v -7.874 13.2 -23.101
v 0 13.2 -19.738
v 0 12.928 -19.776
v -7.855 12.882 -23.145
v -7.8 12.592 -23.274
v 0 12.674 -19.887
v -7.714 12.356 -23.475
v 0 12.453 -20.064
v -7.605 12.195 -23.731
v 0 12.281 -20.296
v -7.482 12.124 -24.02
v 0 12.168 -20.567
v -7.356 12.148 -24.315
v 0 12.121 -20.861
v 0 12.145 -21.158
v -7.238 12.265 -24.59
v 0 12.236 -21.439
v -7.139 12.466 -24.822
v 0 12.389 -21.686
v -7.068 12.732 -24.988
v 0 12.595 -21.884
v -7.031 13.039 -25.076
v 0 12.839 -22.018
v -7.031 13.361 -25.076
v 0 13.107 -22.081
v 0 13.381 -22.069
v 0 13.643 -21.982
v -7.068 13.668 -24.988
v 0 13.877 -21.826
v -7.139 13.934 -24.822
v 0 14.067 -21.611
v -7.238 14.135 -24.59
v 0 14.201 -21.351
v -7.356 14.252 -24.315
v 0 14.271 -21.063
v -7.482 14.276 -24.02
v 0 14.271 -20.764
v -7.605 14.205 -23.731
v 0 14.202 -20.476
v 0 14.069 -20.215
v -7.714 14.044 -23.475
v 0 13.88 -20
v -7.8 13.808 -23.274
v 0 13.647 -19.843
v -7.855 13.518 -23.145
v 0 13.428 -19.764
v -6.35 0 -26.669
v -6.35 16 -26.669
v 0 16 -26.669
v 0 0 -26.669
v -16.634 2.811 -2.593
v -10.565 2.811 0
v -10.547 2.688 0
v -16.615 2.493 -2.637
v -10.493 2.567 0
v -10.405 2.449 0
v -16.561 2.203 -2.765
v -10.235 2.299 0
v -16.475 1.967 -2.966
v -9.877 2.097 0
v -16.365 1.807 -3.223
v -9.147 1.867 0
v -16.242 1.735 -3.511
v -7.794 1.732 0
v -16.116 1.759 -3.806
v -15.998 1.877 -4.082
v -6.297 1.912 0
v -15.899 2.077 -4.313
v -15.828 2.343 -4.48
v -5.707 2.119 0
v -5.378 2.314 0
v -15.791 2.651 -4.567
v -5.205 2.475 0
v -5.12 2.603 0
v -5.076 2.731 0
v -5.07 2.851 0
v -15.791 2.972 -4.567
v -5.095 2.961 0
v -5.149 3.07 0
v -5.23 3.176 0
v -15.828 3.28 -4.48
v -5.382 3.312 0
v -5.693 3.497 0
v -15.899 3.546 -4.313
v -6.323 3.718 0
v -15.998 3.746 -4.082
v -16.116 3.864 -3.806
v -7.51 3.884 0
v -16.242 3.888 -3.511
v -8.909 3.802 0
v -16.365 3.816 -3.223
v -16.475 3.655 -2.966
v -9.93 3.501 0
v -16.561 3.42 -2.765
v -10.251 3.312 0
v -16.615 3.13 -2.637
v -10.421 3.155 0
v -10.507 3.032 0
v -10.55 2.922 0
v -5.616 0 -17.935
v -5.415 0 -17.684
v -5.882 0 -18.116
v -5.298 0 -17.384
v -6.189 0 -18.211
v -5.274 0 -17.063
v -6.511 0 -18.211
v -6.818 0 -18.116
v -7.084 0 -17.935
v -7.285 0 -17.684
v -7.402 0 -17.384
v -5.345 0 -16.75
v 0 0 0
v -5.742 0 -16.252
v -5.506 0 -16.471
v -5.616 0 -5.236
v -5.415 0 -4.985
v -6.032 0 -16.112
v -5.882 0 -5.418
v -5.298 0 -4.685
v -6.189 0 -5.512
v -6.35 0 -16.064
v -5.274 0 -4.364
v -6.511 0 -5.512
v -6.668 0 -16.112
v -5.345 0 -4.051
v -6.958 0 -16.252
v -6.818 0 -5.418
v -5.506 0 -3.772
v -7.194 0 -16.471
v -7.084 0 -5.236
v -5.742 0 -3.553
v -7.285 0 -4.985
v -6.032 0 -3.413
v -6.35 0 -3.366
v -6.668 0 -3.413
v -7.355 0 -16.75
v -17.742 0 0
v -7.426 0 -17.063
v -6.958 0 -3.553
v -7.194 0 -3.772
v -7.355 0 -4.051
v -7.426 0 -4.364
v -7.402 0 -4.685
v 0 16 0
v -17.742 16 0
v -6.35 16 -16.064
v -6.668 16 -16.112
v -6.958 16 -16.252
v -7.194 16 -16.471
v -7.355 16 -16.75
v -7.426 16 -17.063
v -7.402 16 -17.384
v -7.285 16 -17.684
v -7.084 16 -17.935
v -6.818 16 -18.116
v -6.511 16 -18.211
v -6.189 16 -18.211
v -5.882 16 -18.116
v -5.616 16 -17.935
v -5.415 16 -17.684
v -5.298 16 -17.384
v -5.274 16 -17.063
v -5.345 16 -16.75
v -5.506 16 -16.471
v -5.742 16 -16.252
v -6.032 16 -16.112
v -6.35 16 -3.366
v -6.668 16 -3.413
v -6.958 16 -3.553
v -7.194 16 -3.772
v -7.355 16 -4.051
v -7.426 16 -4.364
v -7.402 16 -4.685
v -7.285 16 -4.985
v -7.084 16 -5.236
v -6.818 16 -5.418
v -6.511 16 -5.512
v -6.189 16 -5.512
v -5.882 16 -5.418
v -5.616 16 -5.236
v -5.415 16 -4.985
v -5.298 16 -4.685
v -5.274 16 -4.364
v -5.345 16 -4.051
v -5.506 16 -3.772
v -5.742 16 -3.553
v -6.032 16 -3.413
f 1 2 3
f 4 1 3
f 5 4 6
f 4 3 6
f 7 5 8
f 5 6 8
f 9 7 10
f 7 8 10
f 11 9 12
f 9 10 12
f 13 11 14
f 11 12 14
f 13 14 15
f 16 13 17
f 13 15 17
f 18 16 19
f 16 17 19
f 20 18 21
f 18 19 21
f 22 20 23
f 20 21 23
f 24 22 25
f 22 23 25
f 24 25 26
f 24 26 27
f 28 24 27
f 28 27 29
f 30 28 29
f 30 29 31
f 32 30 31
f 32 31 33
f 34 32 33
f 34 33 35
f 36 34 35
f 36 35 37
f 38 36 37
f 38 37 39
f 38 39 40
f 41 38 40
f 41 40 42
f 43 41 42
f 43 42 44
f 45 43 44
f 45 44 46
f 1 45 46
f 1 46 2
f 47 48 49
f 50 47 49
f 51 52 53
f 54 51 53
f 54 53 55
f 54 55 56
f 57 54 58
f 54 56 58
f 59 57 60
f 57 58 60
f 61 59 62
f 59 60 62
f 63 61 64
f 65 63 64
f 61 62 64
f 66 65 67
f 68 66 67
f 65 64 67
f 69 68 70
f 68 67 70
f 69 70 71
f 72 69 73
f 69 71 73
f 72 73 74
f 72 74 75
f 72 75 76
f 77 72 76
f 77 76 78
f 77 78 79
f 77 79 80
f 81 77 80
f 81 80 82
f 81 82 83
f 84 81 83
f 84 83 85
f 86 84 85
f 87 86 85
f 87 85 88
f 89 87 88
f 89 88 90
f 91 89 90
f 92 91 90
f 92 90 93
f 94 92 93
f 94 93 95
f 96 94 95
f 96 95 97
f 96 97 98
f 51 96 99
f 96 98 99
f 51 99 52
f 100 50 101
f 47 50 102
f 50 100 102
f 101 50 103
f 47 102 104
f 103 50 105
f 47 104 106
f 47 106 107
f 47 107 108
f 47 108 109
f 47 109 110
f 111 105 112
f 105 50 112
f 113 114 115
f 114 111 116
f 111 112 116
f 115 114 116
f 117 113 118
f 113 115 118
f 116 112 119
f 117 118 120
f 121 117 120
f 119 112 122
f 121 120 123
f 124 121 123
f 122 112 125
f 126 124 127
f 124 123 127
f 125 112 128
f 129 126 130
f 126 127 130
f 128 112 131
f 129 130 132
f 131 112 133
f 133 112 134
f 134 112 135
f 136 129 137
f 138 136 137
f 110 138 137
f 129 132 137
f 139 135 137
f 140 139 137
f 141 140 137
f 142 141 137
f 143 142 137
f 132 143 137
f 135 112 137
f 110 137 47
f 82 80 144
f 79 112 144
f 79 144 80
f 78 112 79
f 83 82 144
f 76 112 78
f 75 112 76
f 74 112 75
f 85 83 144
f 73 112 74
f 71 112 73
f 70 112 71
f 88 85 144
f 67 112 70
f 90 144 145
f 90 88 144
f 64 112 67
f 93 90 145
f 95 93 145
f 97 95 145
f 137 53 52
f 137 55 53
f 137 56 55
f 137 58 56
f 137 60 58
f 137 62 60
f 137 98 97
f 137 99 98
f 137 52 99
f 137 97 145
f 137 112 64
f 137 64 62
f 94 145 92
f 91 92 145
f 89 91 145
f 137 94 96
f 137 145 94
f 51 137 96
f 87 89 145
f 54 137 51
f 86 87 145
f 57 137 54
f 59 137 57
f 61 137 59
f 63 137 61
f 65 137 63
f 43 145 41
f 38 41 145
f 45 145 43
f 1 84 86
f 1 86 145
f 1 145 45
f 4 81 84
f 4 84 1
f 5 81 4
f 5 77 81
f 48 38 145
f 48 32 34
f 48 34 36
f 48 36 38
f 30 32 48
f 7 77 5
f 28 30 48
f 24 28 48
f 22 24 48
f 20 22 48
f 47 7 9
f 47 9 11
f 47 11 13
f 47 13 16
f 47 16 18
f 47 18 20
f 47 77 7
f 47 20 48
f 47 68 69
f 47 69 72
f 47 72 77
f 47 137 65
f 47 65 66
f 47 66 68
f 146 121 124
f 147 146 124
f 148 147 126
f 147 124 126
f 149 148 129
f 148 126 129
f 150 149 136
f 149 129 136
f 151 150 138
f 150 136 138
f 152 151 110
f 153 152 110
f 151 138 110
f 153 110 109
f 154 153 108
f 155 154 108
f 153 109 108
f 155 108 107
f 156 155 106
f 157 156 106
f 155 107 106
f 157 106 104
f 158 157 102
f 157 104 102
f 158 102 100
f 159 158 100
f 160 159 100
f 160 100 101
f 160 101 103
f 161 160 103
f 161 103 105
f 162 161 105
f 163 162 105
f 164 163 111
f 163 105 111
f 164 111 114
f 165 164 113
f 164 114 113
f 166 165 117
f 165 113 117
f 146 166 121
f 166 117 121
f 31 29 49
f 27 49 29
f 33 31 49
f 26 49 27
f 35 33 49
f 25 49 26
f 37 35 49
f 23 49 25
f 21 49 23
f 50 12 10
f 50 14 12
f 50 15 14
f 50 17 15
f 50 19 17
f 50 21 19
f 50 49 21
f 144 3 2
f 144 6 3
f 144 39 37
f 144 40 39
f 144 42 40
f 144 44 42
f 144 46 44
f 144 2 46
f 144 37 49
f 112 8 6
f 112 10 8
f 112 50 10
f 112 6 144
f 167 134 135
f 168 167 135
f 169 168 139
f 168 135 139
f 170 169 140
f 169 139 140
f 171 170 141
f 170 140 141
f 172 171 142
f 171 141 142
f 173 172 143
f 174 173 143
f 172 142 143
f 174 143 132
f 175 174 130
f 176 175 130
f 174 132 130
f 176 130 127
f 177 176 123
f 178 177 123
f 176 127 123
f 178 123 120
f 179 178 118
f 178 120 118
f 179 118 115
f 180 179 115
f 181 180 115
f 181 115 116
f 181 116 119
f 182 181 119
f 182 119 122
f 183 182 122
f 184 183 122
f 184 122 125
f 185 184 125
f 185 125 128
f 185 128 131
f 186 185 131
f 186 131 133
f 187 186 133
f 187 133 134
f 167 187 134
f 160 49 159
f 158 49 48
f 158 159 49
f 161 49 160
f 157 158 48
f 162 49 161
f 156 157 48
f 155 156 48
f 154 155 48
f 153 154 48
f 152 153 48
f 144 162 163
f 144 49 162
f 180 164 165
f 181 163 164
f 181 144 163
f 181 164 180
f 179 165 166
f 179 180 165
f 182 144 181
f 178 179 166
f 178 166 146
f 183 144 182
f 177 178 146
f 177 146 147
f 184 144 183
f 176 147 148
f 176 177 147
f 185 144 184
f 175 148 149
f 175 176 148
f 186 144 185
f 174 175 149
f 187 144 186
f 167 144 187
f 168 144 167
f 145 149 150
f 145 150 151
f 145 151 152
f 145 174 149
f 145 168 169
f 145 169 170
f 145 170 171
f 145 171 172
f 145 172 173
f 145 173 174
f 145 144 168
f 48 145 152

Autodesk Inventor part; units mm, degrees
ref_plane "YZ Plane" through (0, 0, 0) normal (1, 0, 0) x (0, 1, 0)
ref_plane "XZ Plane" through (0, 0, 0) normal (0, 1, 0) x (-1, 0, 0)
ref_plane "XY Plane" through (0, 0, 0) normal (0, 0, 1) x (1, 0, 0)
sketch "Sketch1" plane through (0, 0, 0) normal (0, 1, 0) x (-1, 0, 0)
  line L0 (0, 0) -> (17.7417, 0)
  line L1 (17.7417, 0) -> (6.35, -26.6689)
  line L2 (6.35, -26.6689) -> (0, -26.6689)
  line L3 (0, -26.6689) -> (0, 0)
  dimension "d0" = 23.13
  dimension "d1" = 29
  dimension "d2" = 6.35
extrude "Extrusion1" add sketch "Sketch1" along normal blind 16
sketch "Sketch2" plane through (-17.7417, 0, 0) normal (-0.9196159, 0, -0.3928187) x (-0.3928187, 0, 0.9196159)
  line L0 (-29, 16) -> (0, 16) construction
  line L1 (-29, 0) -> (-29, 16) construction
  line L2 (0, 0) -> (-29, 0) construction
  line L3 (0, 0) -> (0, 16) construction
  point P0 (-6.9693, 0)
  point P1 (-3.8988, 2.8114)
  point P2 (-26.2, 13.2)
  dimension "d5" = 2.8
  dimension "d6" = 2.8
  dimension "d26" = 22.3012
  dimension "d27" = 10.3886
hole "Hole1" at (-16.2102, 2.8114, -3.5854) at (-7.4499, 13.2, -24.0939) direction (0.9196159, 0, 0.3928187) diameter 2.159 end through all
sketch "Sketch3" plane through (0, 16, 0) normal (0, 1, 0) x (1, 0, 0)
  line L0 (-17.7417, 0) -> (0, 0) construction
  line L1 (-6.35, 0) -> (-6.35, 26.6689) construction
  line L2 (0, 26.6689) -> (-6.35, 26.6689) construction
  line L3 (0, 0) -> (0, 26.6689) construction
  point P0 (-6.35, 4.445)
  point P1 (-6.35, 17.1439)
  dimension "d16" = 6.35
  dimension "d17" = 4.445
  dimension "d18" = 9.525
  dimension "d28" = 12.6989
hole "Hole2" at (-6.35, 16, -4.445) at (-6.35, 16, -17.1439) direction (0, -1, 0) diameter 2.159 end through all
equation "\"d6\" = d5"
properties part number "Microswitch_Bracket" material "ABS Plastic"
